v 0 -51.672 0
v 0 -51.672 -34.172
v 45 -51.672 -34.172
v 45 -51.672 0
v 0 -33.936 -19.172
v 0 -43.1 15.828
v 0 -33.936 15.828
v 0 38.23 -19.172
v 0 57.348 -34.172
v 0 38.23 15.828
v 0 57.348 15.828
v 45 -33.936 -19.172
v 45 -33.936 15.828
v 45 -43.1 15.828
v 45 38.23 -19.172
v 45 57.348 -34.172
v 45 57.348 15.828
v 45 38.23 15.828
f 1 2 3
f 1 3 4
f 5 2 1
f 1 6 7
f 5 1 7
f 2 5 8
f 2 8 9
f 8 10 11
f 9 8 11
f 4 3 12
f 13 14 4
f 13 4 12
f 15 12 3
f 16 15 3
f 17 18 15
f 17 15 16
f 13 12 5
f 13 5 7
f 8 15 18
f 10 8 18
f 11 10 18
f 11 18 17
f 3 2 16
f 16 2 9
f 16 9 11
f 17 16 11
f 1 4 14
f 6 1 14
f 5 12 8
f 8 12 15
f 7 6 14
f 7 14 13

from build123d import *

# Parameters (mm, degrees)
F0_W     = 109.020278
F0_H     = 50
F1_DEPTH = 45
F3_DEPTH = 207
F4_W     = 72.165563
F4_H     = 35
F5_DEPTH = 228


with BuildPart() as f1:
    # F0 (on Right) → F1 (new body)
    with BuildSketch(Plane.YZ):
        with Locations((2.837837, -9.1723)):
            Rectangle(F0_W, F0_H)
    extrude(amount=F1_DEPTH)

    # F2 (on face) → F3 (cut)
    with BuildSketch(Plane.YZ.offset(45)):
        Polygon((-51.672302, 0), (-43.100026, 15.8277), (-51.672302, 15.8277), align=None)
    extrude(amount=-F3_DEPTH, mode=Mode.SUBTRACT)

    # F4 (on face) → F5 (cut)
    with BuildSketch(Plane.YZ.offset(45)):
        with Locations((2.14697, -1.6723)):
            Rectangle(F4_W, F4_H)
    extrude(amount=-F5_DEPTH, mode=Mode.SUBTRACT)


solid = f1.part
